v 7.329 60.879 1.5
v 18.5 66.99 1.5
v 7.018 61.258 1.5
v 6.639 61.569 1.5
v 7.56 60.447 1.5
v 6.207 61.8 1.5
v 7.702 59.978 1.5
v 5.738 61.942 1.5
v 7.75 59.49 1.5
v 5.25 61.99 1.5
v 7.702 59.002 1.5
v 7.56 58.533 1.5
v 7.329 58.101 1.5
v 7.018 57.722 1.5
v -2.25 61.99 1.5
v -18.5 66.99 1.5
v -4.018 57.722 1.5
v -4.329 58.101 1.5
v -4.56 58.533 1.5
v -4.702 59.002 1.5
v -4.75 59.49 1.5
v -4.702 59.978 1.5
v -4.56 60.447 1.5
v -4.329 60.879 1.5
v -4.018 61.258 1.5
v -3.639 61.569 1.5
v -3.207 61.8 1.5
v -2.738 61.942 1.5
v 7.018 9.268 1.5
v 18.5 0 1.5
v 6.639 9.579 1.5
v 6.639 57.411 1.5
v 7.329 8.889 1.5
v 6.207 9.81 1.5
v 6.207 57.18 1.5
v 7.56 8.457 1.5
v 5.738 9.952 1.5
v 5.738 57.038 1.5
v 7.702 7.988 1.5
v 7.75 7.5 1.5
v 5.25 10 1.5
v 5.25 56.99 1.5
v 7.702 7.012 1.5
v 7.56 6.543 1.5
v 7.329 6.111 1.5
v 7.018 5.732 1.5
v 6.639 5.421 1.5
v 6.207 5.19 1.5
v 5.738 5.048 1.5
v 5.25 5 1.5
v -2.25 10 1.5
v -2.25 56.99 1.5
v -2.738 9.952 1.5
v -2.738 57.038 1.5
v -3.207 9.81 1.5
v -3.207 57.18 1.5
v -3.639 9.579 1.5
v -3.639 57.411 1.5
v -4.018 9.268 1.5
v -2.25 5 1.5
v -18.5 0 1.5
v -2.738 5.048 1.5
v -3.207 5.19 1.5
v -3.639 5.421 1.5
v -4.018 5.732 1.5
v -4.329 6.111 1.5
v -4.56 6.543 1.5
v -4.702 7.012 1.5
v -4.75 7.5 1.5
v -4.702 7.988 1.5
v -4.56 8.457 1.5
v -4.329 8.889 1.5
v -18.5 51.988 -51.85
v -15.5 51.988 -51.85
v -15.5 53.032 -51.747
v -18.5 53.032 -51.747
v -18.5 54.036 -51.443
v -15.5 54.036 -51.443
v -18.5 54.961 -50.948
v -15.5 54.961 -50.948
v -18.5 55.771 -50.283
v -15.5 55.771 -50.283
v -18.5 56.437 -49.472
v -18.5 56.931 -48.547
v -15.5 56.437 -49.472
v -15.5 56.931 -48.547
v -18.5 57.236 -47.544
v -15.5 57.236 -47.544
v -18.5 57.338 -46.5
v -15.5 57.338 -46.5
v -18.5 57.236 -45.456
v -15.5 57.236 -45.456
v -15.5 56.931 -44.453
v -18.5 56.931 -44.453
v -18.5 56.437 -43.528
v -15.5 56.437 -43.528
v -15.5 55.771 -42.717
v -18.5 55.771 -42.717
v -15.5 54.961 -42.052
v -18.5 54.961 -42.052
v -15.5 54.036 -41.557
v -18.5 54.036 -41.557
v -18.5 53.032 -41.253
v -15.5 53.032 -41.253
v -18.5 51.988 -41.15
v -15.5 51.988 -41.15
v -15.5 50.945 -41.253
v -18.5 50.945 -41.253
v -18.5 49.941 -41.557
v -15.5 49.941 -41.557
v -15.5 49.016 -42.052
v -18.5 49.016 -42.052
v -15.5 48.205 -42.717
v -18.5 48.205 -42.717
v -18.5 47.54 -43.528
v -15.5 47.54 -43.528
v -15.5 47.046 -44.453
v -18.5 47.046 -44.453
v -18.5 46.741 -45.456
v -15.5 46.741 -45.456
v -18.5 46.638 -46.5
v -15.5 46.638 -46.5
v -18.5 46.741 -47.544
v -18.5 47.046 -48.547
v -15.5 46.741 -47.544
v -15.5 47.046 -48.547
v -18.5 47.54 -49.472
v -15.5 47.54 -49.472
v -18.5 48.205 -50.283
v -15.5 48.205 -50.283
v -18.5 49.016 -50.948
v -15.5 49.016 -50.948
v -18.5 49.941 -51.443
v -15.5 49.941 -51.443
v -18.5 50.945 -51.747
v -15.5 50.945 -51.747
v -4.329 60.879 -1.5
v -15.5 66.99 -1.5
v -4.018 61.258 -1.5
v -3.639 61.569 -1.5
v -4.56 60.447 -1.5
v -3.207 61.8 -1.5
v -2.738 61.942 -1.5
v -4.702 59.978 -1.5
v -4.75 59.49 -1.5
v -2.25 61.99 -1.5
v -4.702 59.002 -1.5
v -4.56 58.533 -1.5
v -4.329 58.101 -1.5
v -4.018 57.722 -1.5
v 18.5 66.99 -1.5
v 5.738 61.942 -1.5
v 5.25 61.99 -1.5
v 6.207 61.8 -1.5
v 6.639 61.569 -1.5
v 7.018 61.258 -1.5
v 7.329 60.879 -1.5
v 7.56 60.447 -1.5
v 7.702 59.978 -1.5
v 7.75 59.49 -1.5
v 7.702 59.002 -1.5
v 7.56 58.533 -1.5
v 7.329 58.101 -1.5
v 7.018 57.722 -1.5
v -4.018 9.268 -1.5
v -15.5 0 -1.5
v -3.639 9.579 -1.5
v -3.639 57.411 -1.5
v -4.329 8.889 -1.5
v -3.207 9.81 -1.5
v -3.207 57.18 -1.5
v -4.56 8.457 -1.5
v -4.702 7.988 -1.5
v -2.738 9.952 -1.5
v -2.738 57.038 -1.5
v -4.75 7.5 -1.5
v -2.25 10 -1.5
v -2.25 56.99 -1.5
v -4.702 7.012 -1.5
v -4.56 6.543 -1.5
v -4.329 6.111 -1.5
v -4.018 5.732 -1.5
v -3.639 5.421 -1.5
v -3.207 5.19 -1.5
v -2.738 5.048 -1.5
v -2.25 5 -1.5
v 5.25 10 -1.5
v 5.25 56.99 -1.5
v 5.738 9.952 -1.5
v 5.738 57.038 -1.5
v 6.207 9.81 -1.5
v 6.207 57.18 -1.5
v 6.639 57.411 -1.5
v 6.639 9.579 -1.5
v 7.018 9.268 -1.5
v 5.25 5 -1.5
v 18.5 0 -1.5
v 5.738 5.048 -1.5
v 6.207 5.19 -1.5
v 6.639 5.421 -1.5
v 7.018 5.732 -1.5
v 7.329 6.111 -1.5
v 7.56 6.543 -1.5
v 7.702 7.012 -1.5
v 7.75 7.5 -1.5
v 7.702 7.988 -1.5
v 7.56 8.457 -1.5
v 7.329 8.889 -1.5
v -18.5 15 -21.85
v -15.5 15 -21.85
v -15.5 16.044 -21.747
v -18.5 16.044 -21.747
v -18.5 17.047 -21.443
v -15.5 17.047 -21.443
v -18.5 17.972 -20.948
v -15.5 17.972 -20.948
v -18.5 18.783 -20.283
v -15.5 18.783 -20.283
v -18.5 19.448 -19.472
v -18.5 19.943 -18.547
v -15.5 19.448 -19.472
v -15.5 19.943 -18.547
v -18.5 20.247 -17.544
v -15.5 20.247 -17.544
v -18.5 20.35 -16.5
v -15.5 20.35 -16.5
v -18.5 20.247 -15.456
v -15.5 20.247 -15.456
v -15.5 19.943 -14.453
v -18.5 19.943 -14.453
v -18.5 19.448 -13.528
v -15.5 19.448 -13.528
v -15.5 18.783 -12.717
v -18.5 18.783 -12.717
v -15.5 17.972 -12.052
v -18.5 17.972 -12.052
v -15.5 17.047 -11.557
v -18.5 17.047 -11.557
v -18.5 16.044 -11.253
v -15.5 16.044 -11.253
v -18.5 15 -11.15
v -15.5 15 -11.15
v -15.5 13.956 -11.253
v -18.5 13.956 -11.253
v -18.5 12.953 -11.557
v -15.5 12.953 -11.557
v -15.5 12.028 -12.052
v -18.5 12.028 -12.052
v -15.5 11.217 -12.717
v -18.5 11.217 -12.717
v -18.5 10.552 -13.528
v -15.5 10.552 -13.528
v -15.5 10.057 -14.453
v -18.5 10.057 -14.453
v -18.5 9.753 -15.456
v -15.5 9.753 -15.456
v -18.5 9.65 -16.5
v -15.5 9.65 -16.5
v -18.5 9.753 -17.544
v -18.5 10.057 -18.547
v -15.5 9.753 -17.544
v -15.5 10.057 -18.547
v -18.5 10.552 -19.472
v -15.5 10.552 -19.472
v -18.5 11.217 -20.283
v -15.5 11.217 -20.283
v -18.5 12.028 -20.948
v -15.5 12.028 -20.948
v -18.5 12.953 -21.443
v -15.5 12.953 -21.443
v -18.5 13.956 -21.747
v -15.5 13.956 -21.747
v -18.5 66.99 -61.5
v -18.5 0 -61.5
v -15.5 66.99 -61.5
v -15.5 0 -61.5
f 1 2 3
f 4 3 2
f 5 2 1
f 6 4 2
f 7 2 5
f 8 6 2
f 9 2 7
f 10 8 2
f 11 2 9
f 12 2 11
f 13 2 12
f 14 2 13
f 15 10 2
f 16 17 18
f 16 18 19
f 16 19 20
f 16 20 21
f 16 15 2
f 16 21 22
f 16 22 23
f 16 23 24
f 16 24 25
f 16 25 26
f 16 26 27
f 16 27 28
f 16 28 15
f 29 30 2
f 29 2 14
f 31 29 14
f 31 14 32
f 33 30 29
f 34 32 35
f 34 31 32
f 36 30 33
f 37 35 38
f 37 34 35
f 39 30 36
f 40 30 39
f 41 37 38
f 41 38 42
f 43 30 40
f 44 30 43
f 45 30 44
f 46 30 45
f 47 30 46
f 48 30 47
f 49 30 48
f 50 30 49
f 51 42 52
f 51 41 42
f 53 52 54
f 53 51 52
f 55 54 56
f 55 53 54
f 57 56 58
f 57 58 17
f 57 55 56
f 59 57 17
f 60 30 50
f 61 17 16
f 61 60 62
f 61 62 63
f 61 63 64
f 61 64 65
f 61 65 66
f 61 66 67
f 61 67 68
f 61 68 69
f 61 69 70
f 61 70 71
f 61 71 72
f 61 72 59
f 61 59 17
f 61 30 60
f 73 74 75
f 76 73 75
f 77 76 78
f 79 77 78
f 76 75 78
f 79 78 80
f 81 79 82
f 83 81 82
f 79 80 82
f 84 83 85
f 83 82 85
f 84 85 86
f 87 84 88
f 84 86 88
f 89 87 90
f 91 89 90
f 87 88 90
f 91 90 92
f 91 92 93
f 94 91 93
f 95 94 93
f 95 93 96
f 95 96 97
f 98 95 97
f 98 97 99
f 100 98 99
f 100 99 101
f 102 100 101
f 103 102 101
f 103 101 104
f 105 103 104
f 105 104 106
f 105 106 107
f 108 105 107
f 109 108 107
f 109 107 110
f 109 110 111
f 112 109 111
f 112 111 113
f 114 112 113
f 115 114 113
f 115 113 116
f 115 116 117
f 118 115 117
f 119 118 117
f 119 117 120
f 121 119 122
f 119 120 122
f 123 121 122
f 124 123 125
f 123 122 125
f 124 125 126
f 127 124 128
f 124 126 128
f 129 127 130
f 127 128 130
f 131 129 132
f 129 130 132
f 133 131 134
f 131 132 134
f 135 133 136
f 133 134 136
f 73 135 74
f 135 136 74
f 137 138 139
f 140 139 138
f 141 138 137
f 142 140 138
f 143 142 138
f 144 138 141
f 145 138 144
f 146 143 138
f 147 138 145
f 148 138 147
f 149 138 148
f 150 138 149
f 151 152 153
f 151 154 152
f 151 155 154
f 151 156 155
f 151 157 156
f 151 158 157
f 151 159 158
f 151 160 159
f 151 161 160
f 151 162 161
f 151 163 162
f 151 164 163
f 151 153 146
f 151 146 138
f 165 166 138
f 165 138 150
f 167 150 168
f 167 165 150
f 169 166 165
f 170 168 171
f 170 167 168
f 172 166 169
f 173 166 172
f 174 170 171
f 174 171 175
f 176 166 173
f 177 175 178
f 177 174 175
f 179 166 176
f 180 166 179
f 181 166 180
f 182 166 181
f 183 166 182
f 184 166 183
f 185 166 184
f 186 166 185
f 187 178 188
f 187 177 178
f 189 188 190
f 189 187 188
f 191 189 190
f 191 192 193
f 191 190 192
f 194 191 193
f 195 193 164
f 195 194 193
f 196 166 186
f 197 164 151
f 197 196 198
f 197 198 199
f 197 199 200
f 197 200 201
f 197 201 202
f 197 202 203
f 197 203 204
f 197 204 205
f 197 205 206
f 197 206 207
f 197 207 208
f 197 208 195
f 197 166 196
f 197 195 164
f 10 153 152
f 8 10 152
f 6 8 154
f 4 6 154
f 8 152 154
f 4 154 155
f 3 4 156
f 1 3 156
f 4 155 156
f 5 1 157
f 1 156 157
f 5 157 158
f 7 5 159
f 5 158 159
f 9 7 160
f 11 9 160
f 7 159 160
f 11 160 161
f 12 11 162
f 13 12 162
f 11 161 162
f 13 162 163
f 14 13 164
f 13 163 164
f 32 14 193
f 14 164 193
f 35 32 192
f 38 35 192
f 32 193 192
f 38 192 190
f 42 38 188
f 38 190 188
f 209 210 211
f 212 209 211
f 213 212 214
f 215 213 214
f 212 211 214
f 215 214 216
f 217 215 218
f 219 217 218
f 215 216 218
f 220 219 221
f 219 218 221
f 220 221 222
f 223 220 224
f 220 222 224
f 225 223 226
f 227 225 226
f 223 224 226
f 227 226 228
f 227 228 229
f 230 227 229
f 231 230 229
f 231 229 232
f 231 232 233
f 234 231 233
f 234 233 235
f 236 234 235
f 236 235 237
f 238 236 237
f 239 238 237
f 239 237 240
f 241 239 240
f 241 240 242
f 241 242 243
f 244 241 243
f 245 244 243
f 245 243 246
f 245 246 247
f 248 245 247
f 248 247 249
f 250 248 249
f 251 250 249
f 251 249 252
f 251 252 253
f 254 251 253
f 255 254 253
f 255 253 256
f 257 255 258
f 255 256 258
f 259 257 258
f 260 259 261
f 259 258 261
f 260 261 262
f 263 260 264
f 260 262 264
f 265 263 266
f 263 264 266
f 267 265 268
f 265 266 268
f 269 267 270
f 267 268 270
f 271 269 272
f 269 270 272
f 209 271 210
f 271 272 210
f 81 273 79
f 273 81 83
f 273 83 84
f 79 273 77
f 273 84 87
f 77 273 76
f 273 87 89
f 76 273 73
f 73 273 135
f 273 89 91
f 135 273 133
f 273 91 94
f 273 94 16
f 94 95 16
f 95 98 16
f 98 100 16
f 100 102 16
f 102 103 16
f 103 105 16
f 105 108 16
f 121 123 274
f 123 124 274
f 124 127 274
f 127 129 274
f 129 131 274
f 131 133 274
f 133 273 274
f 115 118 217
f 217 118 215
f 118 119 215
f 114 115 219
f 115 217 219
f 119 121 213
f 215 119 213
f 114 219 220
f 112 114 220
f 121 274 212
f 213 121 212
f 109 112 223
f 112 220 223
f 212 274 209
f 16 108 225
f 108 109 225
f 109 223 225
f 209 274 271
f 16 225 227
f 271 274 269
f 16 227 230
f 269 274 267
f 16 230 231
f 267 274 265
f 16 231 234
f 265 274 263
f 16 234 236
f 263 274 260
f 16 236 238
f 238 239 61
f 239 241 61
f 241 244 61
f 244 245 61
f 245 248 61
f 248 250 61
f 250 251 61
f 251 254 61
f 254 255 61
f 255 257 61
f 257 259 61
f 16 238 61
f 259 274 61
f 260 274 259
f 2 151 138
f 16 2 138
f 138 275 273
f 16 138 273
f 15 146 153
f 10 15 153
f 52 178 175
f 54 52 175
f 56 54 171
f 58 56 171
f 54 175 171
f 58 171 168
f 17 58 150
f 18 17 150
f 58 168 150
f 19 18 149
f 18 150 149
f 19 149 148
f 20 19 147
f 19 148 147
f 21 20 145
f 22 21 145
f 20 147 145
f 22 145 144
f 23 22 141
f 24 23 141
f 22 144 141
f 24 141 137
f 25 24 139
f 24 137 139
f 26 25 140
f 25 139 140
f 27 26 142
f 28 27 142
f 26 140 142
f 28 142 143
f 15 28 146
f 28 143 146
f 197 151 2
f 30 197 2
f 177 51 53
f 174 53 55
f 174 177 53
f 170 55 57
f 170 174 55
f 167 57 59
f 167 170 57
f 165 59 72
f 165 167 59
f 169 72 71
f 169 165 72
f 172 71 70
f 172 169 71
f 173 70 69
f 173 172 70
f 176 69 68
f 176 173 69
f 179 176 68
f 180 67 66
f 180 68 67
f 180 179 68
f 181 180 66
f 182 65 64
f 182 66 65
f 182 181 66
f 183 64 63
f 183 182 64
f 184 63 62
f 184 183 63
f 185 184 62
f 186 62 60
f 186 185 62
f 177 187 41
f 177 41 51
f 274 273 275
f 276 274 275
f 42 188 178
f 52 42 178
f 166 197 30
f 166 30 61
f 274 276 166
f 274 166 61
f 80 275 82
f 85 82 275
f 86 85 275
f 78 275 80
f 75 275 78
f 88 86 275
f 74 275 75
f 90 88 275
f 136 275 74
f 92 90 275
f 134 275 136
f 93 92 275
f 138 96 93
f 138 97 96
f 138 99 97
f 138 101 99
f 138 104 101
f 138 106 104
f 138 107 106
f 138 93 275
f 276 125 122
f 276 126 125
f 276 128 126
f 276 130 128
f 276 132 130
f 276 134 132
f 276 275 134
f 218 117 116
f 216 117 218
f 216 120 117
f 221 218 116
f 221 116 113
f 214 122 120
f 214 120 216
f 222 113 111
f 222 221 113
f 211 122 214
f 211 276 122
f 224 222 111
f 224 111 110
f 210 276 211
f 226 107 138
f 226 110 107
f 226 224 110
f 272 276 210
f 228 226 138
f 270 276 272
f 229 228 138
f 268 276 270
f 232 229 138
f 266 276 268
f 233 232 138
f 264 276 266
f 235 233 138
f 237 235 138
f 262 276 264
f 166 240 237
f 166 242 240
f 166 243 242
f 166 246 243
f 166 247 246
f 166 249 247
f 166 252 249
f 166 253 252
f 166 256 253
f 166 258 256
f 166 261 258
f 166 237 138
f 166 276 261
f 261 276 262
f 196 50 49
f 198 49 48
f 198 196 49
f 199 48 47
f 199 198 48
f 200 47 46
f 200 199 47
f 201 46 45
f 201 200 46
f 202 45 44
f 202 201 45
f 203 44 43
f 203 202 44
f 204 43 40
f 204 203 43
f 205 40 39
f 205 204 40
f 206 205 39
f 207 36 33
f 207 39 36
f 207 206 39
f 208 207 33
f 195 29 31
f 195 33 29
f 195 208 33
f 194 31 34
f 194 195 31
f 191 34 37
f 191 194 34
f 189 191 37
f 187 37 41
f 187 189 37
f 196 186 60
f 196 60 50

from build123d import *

# Parameters (mm, degrees)
BOSS_EXTRUDE1_DEPTH = 66.99
SKETCH2_R           = 5.35
CUT_EXTRUDE1_DEPTH  = 98.087126335
CUT_EXTRUDE2_DEPTH  = 92.814541877


with BuildPart() as part:
    # Sketch1 → Boss-Extrude1 (new body)
    with BuildSketch(Plane(origin=(0, 0, 0), x_dir=(1, 0, 0), z_dir=(0, 1, 0))):
        Polygon((-18.5, 1.5), (-18.5, 61.5), (-15.5, 61.5), (-15.5, 1.5), (18.5, 1.5), (18.5, -1.5), (-18.5, -1.5), align=None)
    extrude(amount=BOSS_EXTRUDE1_DEPTH)

    # Sketch2 → Cut-Extrude1 (cut, through all)
    with BuildSketch(Plane(origin=(-15.5, 0, 0), x_dir=(0, 0, -1), z_dir=(1, 0, 0))):
        with Locations((16.5, 15)):
            Circle(SKETCH2_R)
        with Locations((46.5, 51.988385001)):
            Circle(SKETCH2_R)
    extrude(amount=-CUT_EXTRUDE1_DEPTH, mode=Mode.SUBTRACT)

    # Sketch3 → Cut-Extrude2 (cut, through all)
    with BuildSketch(Plane(origin=(0, 0, -1.5), x_dir=(-1, 0, 0), z_dir=(0, 0, -1))):
        with BuildLine():
            Line((-5.25, 10), (2.25, 10))
            ThreePointArc((2.25, 10), (4.75, 7.5), (2.25, 5))
            Line((2.25, 5), (-5.25, 5))
            ThreePointArc((-5.25, 5), (-7.75, 7.5), (-5.25, 10))
        make_face()
        with BuildLine():
            Line((-5.25, 56.99), (2.25, 56.99))
            ThreePointArc((2.25, 56.99), (4.75, 59.49), (2.25, 61.99))
            Line((2.25, 61.99), (-5.25, 61.99))
            ThreePointArc((-5.25, 61.99), (-7.75, 59.49), (-5.25, 56.99))
        make_face()
    extrude(amount=-CUT_EXTRUDE2_DEPTH, mode=Mode.SUBTRACT)


solid = part.part
